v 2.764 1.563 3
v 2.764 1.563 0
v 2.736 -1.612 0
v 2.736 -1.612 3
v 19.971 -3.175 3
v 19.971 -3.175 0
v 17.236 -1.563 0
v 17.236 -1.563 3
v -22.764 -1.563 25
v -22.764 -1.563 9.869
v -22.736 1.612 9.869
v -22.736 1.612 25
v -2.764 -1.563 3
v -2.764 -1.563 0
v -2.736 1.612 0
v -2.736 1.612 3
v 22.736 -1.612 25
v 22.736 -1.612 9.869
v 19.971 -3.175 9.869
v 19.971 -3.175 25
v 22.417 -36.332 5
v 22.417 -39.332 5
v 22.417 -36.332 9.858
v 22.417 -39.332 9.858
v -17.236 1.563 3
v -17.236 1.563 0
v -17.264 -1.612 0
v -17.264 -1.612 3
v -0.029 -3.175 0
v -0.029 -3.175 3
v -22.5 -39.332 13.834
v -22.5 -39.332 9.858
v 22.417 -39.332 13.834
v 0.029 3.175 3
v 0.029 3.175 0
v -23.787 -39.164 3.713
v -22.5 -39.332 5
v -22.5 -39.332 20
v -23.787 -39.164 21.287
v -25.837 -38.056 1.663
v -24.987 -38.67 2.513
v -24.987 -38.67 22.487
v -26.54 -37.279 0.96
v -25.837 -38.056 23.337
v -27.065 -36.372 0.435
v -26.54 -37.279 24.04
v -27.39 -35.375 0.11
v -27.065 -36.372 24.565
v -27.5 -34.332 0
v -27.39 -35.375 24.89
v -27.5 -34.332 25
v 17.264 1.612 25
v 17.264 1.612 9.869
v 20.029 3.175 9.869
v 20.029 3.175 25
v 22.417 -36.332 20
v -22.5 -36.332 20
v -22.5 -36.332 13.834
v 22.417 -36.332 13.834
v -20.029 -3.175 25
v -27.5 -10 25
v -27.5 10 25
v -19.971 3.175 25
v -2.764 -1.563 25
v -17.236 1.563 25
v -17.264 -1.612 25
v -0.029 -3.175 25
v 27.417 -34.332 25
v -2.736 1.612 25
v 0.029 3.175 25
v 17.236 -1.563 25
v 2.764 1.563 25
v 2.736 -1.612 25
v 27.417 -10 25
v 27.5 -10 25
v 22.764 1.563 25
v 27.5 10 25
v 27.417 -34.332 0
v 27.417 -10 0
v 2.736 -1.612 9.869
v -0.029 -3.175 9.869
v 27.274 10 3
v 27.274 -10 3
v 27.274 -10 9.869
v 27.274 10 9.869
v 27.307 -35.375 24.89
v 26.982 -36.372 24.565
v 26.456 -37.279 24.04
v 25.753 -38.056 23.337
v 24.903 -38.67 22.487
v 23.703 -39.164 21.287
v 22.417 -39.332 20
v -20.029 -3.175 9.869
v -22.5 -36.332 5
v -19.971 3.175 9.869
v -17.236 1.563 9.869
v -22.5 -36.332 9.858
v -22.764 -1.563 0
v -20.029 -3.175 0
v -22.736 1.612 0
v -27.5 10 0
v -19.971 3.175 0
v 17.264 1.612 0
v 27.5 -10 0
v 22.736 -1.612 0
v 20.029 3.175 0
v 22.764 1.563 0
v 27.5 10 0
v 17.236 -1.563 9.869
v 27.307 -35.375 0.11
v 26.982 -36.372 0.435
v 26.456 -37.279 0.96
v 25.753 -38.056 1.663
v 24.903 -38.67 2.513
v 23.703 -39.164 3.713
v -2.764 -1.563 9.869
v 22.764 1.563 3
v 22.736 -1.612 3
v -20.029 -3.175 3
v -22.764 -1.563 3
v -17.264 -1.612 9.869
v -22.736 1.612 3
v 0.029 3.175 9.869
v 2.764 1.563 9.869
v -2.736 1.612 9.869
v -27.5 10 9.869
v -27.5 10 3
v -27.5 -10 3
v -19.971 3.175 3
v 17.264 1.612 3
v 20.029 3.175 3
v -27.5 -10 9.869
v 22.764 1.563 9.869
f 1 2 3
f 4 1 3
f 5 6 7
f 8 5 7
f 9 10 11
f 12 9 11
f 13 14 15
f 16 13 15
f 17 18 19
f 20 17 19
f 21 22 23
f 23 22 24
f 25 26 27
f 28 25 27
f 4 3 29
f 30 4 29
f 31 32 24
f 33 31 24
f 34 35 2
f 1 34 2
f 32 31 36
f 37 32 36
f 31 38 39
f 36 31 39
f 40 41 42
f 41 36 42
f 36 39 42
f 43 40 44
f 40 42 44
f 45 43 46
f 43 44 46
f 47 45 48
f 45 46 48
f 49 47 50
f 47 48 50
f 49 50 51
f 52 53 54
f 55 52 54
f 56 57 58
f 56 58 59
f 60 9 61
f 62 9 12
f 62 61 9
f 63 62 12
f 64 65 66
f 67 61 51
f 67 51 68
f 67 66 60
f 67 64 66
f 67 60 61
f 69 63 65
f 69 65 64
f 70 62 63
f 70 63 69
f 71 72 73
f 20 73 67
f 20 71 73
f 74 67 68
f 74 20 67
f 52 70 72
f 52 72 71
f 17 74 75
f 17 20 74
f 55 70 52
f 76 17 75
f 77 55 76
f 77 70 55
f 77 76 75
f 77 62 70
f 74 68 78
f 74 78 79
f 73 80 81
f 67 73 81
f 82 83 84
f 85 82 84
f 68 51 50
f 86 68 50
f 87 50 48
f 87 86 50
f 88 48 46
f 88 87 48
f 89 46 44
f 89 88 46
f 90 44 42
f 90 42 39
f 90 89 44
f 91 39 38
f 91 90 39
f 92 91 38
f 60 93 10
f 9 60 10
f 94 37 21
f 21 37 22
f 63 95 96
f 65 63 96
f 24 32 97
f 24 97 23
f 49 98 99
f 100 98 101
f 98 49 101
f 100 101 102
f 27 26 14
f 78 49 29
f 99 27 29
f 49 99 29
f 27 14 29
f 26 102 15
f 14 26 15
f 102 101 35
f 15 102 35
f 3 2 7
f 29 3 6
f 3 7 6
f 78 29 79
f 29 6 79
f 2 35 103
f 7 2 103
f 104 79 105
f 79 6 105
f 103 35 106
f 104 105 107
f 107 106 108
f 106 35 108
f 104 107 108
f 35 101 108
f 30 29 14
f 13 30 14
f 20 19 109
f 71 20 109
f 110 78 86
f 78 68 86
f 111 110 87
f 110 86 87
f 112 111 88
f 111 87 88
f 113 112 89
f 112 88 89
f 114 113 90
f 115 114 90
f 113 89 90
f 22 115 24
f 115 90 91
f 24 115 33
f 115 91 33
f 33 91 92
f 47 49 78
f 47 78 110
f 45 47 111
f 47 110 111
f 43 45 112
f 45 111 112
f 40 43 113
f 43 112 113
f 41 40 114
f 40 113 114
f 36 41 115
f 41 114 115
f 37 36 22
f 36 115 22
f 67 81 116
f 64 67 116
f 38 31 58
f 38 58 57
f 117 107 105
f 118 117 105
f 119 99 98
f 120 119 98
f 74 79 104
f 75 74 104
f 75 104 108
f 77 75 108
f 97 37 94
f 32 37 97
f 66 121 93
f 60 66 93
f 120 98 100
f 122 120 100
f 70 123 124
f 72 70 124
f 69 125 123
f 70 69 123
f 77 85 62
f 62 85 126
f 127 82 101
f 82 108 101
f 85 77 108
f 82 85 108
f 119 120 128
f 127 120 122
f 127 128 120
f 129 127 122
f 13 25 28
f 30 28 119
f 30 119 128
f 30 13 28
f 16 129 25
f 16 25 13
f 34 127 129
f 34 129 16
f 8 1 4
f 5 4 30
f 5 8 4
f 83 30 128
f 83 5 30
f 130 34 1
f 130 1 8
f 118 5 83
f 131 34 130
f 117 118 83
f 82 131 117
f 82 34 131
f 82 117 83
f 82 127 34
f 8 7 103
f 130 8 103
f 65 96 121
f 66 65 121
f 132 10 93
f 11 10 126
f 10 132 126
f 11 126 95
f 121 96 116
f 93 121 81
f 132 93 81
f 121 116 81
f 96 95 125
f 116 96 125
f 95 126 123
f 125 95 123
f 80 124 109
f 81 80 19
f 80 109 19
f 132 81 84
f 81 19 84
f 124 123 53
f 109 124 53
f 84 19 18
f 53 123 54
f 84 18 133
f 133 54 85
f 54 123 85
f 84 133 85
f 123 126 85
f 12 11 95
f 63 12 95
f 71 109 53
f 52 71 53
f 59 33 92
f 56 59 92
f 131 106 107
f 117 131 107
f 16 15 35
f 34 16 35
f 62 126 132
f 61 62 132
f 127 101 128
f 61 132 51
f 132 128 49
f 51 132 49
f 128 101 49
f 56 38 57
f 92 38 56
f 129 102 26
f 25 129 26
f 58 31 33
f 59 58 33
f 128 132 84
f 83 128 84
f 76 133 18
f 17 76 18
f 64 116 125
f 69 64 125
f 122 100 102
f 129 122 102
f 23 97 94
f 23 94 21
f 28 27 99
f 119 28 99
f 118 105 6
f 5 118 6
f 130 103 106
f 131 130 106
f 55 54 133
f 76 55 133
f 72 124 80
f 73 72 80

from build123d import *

# Parameters (mm, degrees)
F0_W          = 54.9165850133
F0_H          = 29.332328558
F1_DEPTH      = 25
F2_W          = 54.8067912459
F2_H          = 9.8693305627
F3_DEPTH      = 10
F3_DEPTH_BACK = 25
F4_DEPTH      = 3
F5_R          = 5
F6_W          = 44.9165850133
F6_H          = 6.1664939672
F6_H_2        = 4.8576648161
F7_DEPTH      = 3


with BuildPart() as f1:
    # F0 (on Top) → F1 (new body)
    with BuildSketch(Plane.XY):
        with Locations((-0.0417074934, -24.666164279)):
            Rectangle(F0_W, F0_H)
        Polygon((27.5, 10), (-27.5, 10), (-27.5, -10), (27.4165850133, -10), (27.5, -10), align=None)
        Polygon((-22.7641869603, -1.5628831632), (-22.7355900026, 1.6124145468), (-19.9714030424, 3.17529771), (-17.2358130397, 1.5628831632), (-17.2644099974, -1.6124145468), (-20.0285969576, -3.17529771), align=None, mode=Mode.SUBTRACT)
        Polygon((2.7641869603, 1.5628831632), (2.7355900026, -1.6124145468), (-0.0285969576, -3.17529771), (-2.7641869603, -1.5628831632), (-2.7355900026, 1.6124145468), (0.0285969576, 3.17529771), align=None, mode=Mode.SUBTRACT)
        Polygon((22.7641869603, 1.5628831632), (22.7355900026, -1.6124145468), (19.9714030424, -3.17529771), (17.2358130397, -1.5628831632), (17.2644099974, 1.6124145468), (20.0285969576, 3.17529771), align=None, mode=Mode.SUBTRACT)
    extrude(amount=F1_DEPTH)

    # F2 (on Front) → F3 (cut, two sides)
    with BuildSketch(Plane.XZ) as f3_sk:
        with Locations((-0.1290403306, 4.9346652813)):
            Rectangle(F2_W, F2_H)
    extrude(amount=F3_DEPTH, mode=Mode.SUBTRACT)
    extrude(f3_sk.sketch, amount=-F3_DEPTH_BACK, mode=Mode.SUBTRACT)

    # F0 (on Top) → F4 (join)
    with BuildSketch(Plane.XY):
        Polygon((27.5, 10), (-27.5, 10), (-27.5, -10), (27.4165850133, -10), (27.5, -10), align=None)
        Polygon((-22.7641869603, -1.5628831632), (-22.7355900026, 1.6124145468), (-19.9714030424, 3.17529771), (-17.2358130397, 1.5628831632), (-17.2644099974, -1.6124145468), (-20.0285969576, -3.17529771), align=None, mode=Mode.SUBTRACT)
        Polygon((2.7641869603, 1.5628831632), (2.7355900026, -1.6124145468), (-0.0285969576, -3.17529771), (-2.7641869603, -1.5628831632), (-2.7355900026, 1.6124145468), (0.0285969576, 3.17529771), align=None, mode=Mode.SUBTRACT)
        Polygon((22.7641869603, 1.5628831632), (22.7355900026, -1.6124145468), (19.9714030424, -3.17529771), (17.2358130397, -1.5628831632), (17.2644099974, 1.6124145468), (20.0285969576, 3.17529771), align=None, mode=Mode.SUBTRACT)
    extrude(amount=F4_DEPTH)

    # F5
    f5_edges = [f1.edges().sort_by_distance(p)[0] for p in [
        (-0.041707, -39.332329, 25),
        (-0.041707, -39.332329, 0),
        (27.416585, -39.332329, 12.5),
        (-27.5, -39.332329, 12.5),
    ]]
    fillet(f5_edges, radius=F5_R)

    # F6 (on face) → F7 (cut)
    with BuildSketch(Plane.XZ.offset(39.332328558)):
        with Locations((-0.0417074934, 16.9167530164)):
            Rectangle(F6_W, F6_H)
        with Locations((-0.0417074934, 7.428832408)):
            Rectangle(F6_W, F6_H_2)
    extrude(amount=-F7_DEPTH, mode=Mode.SUBTRACT)


solid = f1.part
